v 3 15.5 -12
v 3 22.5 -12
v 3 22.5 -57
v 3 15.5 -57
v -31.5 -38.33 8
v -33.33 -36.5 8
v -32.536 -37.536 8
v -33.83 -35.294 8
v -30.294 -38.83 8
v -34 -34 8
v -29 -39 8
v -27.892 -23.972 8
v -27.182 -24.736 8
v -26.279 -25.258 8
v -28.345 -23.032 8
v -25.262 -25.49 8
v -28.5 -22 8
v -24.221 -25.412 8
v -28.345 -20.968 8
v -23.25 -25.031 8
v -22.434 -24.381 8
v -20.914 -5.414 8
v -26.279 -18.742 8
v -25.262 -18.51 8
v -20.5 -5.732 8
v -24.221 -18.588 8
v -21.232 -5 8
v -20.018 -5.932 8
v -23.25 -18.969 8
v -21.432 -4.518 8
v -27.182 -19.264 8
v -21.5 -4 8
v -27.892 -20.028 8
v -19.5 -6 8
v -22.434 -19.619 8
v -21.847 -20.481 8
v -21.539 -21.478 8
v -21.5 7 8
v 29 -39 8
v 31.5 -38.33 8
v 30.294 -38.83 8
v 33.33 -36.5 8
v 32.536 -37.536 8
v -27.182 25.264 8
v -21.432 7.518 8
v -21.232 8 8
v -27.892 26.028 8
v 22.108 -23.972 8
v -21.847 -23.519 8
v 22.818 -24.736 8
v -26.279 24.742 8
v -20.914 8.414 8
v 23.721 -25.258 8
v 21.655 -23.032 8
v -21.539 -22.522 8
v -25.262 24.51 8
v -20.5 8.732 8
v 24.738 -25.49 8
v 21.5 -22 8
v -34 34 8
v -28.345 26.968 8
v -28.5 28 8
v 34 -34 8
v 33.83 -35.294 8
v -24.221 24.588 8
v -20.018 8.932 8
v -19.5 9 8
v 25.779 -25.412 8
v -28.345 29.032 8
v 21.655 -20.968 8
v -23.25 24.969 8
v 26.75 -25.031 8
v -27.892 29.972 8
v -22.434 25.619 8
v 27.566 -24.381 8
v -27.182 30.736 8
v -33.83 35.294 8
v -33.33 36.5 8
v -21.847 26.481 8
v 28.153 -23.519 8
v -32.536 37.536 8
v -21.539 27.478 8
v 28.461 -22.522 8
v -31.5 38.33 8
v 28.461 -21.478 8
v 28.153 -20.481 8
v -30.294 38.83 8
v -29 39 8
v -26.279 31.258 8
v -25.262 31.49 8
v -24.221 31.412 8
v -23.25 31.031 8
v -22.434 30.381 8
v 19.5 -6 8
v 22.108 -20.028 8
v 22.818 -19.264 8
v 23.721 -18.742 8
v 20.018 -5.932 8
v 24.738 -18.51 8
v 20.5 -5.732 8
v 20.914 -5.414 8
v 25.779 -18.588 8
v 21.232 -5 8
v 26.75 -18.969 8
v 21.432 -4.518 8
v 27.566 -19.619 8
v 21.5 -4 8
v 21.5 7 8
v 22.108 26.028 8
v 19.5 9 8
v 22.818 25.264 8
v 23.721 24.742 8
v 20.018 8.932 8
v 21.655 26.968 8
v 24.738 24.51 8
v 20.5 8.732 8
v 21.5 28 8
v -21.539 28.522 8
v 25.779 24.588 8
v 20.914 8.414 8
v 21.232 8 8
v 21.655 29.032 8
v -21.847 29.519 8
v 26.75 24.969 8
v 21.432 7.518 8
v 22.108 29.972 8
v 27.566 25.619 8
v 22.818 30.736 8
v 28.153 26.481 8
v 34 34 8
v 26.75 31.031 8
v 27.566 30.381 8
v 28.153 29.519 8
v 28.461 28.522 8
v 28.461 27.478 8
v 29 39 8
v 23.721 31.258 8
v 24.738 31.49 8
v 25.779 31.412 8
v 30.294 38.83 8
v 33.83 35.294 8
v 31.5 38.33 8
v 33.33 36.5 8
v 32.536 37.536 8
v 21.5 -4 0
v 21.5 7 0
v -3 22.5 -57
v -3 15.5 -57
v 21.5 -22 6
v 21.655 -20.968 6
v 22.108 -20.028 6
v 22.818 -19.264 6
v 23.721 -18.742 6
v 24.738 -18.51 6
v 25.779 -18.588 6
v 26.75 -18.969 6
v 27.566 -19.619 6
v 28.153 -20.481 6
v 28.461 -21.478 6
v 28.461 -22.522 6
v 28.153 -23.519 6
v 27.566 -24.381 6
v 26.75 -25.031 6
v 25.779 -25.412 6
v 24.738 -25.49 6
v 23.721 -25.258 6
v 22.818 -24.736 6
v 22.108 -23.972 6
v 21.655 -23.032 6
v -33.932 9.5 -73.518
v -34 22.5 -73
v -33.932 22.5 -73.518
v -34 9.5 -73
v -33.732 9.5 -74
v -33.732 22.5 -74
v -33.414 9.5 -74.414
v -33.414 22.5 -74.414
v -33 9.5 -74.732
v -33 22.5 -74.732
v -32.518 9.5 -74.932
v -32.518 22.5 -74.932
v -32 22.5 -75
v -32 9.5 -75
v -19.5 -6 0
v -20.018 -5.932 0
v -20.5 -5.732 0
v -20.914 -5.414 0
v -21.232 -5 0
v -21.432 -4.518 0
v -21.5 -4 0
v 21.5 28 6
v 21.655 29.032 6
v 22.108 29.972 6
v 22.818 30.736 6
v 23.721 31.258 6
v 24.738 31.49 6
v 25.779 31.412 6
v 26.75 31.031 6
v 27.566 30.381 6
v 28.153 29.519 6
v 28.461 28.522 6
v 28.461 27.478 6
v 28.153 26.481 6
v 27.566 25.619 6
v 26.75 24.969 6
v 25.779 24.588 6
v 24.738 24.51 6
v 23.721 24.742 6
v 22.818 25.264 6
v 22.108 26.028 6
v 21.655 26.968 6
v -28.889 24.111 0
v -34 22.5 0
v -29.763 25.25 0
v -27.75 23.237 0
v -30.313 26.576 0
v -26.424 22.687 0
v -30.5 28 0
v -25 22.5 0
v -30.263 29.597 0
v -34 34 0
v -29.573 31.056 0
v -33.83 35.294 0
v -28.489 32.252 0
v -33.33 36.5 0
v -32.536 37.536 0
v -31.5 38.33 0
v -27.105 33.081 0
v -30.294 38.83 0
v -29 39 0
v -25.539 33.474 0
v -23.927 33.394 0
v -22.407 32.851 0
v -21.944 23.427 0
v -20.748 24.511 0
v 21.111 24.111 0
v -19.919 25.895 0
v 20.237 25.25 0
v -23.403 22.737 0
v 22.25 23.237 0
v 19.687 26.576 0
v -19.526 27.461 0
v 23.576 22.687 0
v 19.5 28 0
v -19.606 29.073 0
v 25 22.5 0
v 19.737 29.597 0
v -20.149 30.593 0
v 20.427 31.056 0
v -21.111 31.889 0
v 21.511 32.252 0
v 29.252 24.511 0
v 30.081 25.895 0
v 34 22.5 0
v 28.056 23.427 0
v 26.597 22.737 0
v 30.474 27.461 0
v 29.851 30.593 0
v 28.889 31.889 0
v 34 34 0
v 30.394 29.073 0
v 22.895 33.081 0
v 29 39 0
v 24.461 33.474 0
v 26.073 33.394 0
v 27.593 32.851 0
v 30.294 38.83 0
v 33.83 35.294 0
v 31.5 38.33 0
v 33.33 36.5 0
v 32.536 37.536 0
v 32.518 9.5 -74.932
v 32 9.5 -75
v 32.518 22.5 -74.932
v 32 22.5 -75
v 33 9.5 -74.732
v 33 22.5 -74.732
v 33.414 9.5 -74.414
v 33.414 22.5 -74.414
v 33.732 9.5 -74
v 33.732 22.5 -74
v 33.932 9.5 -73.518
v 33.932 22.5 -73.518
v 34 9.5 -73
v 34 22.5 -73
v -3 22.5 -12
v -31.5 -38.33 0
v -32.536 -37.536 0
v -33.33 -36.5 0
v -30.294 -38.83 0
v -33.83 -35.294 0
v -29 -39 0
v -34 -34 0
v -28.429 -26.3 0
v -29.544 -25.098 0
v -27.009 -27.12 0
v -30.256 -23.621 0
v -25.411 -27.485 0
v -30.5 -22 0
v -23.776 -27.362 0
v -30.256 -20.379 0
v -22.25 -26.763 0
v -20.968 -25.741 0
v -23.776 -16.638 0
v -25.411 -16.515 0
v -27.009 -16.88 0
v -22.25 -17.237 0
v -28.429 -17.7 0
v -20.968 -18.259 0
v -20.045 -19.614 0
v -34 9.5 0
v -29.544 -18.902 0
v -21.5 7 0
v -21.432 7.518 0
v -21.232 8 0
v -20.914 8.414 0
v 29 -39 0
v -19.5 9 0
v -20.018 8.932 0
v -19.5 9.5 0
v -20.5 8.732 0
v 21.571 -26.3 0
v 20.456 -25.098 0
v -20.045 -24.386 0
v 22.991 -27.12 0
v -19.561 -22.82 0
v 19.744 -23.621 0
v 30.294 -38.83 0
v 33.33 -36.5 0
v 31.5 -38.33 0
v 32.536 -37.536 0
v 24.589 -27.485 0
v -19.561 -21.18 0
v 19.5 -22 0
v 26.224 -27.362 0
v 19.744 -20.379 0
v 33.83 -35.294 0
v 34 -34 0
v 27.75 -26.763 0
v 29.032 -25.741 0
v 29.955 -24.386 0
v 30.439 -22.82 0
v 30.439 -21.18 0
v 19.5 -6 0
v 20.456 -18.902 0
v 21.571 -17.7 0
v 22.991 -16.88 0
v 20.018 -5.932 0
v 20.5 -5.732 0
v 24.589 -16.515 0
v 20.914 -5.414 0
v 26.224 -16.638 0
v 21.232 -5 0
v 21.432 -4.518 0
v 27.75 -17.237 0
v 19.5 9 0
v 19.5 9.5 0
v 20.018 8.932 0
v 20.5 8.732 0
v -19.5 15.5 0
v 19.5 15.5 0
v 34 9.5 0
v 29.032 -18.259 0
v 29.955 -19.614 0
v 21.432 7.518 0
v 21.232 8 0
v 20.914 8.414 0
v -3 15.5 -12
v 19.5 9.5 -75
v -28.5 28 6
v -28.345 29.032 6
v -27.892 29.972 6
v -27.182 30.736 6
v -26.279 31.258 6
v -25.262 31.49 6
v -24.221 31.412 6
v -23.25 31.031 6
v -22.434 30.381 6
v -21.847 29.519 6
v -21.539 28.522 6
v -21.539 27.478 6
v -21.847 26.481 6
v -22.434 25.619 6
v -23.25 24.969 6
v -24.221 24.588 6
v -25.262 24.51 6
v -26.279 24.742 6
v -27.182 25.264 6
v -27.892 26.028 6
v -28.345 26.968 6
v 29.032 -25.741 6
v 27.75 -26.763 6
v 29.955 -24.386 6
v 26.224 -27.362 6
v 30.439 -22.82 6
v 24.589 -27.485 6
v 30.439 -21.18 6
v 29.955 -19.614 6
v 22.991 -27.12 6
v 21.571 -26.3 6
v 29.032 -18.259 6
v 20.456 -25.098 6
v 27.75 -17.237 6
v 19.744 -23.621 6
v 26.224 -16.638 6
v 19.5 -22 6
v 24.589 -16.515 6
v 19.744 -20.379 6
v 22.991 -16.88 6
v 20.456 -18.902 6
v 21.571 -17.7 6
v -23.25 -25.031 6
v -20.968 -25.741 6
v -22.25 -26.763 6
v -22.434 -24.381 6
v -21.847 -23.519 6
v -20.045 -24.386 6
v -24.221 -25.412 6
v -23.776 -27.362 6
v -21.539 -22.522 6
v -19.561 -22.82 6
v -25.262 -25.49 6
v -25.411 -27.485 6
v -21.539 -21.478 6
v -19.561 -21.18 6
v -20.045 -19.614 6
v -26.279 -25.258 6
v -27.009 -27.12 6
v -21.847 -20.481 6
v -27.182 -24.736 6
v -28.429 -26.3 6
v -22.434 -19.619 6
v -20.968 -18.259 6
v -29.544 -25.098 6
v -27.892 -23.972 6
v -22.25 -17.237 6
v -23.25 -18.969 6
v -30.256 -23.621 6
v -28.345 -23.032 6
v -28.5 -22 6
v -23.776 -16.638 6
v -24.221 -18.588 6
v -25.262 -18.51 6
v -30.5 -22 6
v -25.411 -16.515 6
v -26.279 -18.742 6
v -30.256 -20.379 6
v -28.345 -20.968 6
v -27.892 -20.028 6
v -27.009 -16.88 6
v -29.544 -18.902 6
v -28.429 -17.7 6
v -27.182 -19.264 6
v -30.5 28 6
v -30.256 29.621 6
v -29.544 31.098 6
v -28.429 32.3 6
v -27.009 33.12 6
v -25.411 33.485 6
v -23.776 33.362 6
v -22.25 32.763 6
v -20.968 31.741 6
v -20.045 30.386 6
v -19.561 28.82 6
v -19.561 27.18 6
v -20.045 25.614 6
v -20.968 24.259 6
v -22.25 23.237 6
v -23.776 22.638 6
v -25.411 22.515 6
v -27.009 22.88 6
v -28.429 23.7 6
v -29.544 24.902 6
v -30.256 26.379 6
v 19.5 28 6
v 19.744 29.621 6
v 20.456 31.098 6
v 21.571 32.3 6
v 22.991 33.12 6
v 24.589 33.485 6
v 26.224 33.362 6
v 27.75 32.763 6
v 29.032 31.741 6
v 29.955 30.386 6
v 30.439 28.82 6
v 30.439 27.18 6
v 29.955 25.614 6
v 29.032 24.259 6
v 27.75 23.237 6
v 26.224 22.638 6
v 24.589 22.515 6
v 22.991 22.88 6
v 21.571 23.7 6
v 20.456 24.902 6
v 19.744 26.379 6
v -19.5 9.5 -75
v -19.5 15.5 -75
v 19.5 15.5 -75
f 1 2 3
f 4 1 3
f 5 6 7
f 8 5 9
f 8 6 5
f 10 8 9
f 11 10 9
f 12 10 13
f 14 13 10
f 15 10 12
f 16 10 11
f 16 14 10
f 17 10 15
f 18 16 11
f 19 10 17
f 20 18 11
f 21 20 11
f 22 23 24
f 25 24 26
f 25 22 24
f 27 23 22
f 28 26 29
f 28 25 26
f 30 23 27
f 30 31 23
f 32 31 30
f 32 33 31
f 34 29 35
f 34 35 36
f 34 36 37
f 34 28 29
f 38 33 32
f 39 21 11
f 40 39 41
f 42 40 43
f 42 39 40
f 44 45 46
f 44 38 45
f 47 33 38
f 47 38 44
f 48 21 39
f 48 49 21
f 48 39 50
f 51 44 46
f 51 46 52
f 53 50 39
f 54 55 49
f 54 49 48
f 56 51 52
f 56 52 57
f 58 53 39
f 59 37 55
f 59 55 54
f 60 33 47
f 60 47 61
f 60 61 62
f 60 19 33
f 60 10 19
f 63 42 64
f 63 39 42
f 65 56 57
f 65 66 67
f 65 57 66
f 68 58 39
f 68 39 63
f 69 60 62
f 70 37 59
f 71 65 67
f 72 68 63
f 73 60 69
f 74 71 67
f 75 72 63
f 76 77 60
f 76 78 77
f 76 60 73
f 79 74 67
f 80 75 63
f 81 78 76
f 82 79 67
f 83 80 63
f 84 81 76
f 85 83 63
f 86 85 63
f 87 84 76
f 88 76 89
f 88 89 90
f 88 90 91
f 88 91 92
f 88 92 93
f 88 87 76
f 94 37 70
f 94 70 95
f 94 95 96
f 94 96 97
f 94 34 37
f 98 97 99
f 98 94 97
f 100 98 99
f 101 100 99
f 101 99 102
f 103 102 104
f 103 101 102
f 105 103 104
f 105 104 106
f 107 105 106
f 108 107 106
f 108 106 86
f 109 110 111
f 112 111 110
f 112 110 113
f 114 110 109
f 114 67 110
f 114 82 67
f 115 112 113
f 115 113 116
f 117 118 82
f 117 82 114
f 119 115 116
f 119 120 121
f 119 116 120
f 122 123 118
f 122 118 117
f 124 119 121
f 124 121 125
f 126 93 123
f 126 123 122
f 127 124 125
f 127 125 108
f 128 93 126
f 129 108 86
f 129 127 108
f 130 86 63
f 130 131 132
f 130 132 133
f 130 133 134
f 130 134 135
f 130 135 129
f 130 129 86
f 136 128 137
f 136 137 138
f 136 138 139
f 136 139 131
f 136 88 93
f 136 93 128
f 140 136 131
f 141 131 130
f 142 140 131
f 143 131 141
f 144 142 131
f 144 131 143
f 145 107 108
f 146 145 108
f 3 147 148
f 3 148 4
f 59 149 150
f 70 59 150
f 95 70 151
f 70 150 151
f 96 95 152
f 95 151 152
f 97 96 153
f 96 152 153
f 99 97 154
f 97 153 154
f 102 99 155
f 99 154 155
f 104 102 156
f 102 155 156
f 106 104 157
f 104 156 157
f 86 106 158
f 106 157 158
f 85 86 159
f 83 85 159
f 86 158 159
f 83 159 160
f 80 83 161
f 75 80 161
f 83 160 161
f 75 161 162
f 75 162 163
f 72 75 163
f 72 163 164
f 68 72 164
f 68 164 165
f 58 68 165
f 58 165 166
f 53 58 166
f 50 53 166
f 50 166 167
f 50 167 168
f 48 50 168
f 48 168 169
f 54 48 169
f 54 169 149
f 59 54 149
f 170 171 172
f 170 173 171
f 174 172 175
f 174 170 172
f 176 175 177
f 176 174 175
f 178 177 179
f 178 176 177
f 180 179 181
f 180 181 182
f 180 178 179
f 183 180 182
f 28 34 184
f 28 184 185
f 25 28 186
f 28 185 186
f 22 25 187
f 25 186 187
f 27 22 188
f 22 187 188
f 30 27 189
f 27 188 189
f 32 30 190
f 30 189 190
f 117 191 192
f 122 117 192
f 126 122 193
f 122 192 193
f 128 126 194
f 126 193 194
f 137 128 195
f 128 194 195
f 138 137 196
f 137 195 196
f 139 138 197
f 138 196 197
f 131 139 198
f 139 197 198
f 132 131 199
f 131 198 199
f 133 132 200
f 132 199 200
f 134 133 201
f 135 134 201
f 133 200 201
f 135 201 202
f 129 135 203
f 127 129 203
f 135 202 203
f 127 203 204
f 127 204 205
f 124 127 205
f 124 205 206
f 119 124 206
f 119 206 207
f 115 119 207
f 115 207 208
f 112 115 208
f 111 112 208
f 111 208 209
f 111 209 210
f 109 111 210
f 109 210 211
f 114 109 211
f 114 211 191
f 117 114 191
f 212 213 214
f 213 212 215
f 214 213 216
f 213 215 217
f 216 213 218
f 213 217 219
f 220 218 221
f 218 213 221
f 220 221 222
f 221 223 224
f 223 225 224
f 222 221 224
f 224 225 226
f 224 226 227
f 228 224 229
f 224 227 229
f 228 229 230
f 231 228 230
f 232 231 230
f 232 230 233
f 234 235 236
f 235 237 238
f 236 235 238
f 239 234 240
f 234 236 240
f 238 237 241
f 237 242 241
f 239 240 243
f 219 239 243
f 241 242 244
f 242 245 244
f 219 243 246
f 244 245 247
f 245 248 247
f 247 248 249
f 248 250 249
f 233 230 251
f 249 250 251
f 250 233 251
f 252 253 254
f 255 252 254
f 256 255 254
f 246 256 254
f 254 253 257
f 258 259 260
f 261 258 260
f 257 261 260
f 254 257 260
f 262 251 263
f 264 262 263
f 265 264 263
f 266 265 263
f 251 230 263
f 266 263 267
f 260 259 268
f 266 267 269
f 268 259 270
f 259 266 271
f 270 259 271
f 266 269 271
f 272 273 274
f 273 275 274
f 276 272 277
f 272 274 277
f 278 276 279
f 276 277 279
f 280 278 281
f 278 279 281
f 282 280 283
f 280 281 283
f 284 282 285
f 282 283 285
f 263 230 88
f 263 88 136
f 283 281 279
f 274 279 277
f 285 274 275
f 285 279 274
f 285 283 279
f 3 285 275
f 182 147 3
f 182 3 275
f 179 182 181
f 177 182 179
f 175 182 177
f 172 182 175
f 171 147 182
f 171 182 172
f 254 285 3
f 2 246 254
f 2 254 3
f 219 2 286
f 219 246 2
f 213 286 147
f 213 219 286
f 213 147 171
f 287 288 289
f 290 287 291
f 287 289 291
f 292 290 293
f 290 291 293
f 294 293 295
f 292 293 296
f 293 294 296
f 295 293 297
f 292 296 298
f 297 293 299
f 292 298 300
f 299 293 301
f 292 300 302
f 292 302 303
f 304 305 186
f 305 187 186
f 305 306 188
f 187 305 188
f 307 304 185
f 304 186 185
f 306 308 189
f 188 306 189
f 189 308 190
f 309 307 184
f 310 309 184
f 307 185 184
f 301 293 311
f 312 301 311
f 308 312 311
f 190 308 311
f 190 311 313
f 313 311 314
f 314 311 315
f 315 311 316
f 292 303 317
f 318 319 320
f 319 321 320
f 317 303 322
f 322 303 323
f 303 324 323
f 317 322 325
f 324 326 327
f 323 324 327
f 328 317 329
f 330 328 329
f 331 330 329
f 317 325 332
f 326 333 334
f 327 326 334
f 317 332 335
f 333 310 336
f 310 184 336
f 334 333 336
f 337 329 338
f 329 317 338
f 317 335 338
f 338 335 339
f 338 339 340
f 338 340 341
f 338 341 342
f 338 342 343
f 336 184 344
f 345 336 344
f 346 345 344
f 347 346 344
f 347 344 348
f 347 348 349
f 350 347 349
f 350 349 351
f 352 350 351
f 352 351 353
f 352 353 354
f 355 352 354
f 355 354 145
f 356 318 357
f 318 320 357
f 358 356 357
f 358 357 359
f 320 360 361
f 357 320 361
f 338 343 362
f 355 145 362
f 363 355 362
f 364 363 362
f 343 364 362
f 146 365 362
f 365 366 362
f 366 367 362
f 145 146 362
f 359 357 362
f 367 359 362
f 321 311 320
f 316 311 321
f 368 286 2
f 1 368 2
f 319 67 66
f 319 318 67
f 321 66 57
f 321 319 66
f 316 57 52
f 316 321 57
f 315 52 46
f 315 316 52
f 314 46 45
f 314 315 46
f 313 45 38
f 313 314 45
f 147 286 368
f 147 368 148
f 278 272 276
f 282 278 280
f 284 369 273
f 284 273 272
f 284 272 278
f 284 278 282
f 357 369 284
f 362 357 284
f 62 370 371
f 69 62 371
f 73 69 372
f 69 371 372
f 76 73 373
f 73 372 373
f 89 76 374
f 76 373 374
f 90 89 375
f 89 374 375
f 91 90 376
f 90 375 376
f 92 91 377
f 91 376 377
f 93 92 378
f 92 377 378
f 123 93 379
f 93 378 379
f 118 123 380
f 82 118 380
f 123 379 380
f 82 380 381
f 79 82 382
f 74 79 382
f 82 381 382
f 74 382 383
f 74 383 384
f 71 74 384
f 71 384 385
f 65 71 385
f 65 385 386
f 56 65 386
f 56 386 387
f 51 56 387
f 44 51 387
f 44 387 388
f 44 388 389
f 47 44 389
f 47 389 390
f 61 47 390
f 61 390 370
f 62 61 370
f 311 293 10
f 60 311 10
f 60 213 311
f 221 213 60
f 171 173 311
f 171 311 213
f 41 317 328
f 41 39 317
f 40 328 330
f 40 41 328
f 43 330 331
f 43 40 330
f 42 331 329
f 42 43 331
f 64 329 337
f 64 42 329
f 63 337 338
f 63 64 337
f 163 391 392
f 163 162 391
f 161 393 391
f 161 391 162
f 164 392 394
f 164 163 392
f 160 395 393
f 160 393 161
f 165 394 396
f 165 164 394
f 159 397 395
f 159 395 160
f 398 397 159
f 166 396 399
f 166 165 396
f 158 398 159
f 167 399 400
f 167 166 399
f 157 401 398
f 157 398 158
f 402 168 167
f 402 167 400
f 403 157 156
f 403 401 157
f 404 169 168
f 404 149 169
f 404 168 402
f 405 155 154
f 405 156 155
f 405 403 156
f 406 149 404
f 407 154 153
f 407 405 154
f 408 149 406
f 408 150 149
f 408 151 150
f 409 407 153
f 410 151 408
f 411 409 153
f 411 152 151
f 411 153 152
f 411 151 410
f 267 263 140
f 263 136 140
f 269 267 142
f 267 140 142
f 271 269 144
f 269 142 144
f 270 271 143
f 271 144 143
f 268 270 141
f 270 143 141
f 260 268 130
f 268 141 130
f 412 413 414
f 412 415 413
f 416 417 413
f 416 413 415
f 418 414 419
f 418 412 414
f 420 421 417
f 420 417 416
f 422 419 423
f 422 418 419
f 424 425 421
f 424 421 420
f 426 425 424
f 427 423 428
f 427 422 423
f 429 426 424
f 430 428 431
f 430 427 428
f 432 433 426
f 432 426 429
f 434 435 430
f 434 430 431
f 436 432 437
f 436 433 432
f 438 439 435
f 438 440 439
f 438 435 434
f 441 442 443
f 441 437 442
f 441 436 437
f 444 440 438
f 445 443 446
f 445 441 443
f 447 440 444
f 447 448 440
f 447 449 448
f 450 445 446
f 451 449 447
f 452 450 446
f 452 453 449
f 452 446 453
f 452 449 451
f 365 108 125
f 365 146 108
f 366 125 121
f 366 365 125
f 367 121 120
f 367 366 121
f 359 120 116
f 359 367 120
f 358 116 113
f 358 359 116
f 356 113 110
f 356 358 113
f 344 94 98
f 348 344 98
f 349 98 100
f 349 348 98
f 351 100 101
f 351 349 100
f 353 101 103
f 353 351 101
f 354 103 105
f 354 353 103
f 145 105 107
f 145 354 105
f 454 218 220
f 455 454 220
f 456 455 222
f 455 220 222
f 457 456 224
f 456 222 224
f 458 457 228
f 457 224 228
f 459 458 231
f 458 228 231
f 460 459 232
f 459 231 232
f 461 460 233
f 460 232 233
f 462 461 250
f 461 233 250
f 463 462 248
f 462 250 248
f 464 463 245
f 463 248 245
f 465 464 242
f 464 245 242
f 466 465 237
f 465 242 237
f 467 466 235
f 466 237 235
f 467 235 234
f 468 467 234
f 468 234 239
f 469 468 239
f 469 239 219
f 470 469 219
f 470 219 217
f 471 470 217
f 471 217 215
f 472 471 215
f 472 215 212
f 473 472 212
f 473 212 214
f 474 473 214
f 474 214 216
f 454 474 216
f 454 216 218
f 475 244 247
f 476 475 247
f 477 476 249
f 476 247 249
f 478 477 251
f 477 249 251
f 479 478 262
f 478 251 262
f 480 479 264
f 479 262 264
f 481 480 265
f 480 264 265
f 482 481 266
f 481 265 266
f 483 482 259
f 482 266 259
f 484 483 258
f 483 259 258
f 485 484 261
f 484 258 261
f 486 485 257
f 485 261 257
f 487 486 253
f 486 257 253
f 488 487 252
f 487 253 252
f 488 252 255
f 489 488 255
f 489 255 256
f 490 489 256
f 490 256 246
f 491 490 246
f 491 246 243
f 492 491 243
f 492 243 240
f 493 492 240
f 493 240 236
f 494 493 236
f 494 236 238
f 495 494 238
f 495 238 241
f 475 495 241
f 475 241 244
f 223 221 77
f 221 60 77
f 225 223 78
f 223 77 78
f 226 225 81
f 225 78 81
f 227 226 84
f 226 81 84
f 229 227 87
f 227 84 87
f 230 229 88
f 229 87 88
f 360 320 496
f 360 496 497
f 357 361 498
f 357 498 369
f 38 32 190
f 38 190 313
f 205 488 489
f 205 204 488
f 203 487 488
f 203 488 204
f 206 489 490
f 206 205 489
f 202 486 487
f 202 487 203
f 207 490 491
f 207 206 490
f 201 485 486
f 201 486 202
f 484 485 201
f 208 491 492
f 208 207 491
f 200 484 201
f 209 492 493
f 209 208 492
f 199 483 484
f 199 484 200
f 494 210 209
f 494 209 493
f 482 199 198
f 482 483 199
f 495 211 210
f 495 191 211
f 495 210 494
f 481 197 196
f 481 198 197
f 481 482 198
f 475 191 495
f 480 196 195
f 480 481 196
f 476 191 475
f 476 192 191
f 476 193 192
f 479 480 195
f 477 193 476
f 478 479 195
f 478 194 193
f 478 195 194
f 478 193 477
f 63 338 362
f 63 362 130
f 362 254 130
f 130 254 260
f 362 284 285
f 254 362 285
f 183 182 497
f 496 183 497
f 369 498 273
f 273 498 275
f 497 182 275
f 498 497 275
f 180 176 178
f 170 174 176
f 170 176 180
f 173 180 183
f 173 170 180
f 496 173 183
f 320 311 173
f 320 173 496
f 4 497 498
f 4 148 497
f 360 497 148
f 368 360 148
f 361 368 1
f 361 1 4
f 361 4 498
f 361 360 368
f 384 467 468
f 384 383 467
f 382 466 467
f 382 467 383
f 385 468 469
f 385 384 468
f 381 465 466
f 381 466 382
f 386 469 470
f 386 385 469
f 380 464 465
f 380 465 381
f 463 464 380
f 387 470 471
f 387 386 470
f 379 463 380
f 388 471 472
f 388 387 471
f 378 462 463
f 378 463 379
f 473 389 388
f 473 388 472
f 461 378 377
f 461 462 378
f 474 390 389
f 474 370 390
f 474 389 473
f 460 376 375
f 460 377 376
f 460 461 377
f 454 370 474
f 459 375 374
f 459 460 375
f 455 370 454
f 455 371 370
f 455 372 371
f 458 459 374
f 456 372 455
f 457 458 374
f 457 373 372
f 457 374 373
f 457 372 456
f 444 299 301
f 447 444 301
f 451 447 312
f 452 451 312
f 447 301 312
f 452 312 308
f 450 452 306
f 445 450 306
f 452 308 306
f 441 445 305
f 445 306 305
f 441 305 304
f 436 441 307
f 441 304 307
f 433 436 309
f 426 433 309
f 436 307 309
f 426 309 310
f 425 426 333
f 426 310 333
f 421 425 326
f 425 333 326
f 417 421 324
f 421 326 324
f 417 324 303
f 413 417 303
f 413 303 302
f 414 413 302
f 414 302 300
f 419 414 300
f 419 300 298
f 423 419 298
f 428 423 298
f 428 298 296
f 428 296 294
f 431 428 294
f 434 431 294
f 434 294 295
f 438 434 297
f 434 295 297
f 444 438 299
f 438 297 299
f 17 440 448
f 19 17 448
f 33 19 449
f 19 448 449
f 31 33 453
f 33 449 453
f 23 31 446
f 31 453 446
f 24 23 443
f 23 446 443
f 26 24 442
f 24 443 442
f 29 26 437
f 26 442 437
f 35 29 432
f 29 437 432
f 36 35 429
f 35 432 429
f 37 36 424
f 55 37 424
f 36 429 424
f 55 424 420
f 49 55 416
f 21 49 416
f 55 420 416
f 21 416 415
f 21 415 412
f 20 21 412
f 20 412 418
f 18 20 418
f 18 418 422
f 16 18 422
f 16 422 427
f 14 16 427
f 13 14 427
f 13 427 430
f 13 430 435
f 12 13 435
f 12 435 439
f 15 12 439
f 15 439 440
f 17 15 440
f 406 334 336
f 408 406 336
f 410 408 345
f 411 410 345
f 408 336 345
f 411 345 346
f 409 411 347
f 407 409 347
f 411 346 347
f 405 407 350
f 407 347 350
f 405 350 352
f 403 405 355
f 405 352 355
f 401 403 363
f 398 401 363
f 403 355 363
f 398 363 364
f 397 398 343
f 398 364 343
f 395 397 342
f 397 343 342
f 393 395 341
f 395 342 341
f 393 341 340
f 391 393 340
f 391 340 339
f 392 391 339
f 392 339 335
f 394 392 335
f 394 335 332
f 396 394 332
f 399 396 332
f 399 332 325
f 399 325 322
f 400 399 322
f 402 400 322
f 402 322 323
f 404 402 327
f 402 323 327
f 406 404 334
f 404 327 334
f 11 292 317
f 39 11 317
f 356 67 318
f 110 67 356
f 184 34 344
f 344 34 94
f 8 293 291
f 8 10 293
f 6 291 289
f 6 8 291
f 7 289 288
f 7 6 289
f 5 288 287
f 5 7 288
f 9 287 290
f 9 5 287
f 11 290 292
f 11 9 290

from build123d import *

# Parameters (mm, degrees)
SKETCH1_W           = 68
SKETCH1_H           = 78
BOSS_EXTRUDE1_DEPTH = 8
BOSS_EXTRUDE2_DEPTH = 75
CUT_EXTRUDE1_REACH  = 85
SKETCH3_W           = 43
SKETCH3_H           = 15
FILLET1_R           = 2
FILLET2_R           = 5
SKETCH4_W           = 6
SKETCH4_H           = 45
CUT_EXTRUDE2_DEPTH  = 62.5
SKETCH5_R           = 3.5
CUT_EXTRUDE3_DEPTH  = 9
SKETCH7_R           = 5.5
CUT_EXTRUDE4_DEPTH  = 6


with BuildPart() as part:
    # Sketch1 → Boss-Extrude1 (new body)
    with BuildSketch(Plane.XY):
        Rectangle(SKETCH1_W, SKETCH1_H)
    extrude(amount=BOSS_EXTRUDE1_DEPTH)

    # Sketch2 → Boss-Extrude2 (add)
    with BuildSketch(Plane(origin=(0, 0, 0), x_dir=(-1, 0, 0), z_dir=(0, 0, -1))):
        Polygon((-34, 22.5), (34, 22.5), (34, 9.5), (19.5, 9.5), (19.5, 15.5), (-19.5, 15.5), (-19.5, 9.5), (-34, 9.5), align=None)
    extrude(amount=BOSS_EXTRUDE2_DEPTH)

    # Sketch3 → Cut-Extrude1 (cut, up to next)
    with BuildSketch(Plane.XY.offset(8), mode=Mode.PRIVATE) as cut_extrude1_sk1:
        with Locations((0, 1.5)):
            Rectangle(SKETCH3_W, SKETCH3_H)
    cut_extrude1_tool1 = extrude(cut_extrude1_sk1.sketch, amount=-CUT_EXTRUDE1_REACH, mode=Mode.PRIVATE) & part.part
    add(cut_extrude1_tool1.solids().sort_by_distance((0, 1.5, 8))[0], mode=Mode.SUBTRACT)

    # Fillet1
    fillet1_edges = [part.edges().sort_by_distance(p)[0] for p in [
        (34, 16, -75),
        (-34, 16, -75),
        (-21.5, -6, 4),
        (-21.5, 9, 4),
        (21.5, 9, 4),
        (21.5, -6, 4),
    ]]
    fillet(fillet1_edges, radius=FILLET1_R)

    # Fillet2
    fillet2_edges = [part.edges().sort_by_distance(p)[0] for p in [
        (34, -39, 4),
        (-34, -39, 4),
        (-34, 39, 4),
        (34, 39, 4),
    ]]
    fillet(fillet2_edges, radius=FILLET2_R)

    # Sketch4 → Cut-Extrude2 (cut, through all)
    with BuildSketch(Plane(origin=(0, 22.5, 0), x_dir=(1, 0, 0), z_dir=(0, 1, 0))):
        with Locations((0, 34.5)):
            Rectangle(SKETCH4_W, SKETCH4_H)
    extrude(amount=-CUT_EXTRUDE2_DEPTH, mode=Mode.SUBTRACT)

    # Sketch5 → Cut-Extrude3 (cut, through all)
    with BuildSketch(Plane(origin=(0, 0, 0), x_dir=(-1, 0, 0), z_dir=(0, 0, -1))):
        with Locations((-25, 28)):
            Circle(SKETCH5_R)
        with Locations((25, 28)):
            Circle(SKETCH5_R)
        with Locations((-25, -22)):
            Circle(SKETCH5_R)
        with Locations((25, -22)):
            Circle(SKETCH5_R)
    extrude(amount=-CUT_EXTRUDE3_DEPTH, mode=Mode.SUBTRACT)

    # Sketch7 → Cut-Extrude4 (cut)
    with BuildSketch(Plane(origin=(0, 0, 0), x_dir=(-1, 0, 0), z_dir=(0, 0, -1))):
        with Locations((-25, 28)):
            Circle(SKETCH7_R)
        with Locations((25, 28)):
            Circle(SKETCH7_R)
        with Locations((-25, -22)):
            Circle(SKETCH7_R)
        with Locations((25, -22)):
            Circle(SKETCH7_R)
    extrude(amount=-CUT_EXTRUDE4_DEPTH, mode=Mode.SUBTRACT)


solid = part.part
